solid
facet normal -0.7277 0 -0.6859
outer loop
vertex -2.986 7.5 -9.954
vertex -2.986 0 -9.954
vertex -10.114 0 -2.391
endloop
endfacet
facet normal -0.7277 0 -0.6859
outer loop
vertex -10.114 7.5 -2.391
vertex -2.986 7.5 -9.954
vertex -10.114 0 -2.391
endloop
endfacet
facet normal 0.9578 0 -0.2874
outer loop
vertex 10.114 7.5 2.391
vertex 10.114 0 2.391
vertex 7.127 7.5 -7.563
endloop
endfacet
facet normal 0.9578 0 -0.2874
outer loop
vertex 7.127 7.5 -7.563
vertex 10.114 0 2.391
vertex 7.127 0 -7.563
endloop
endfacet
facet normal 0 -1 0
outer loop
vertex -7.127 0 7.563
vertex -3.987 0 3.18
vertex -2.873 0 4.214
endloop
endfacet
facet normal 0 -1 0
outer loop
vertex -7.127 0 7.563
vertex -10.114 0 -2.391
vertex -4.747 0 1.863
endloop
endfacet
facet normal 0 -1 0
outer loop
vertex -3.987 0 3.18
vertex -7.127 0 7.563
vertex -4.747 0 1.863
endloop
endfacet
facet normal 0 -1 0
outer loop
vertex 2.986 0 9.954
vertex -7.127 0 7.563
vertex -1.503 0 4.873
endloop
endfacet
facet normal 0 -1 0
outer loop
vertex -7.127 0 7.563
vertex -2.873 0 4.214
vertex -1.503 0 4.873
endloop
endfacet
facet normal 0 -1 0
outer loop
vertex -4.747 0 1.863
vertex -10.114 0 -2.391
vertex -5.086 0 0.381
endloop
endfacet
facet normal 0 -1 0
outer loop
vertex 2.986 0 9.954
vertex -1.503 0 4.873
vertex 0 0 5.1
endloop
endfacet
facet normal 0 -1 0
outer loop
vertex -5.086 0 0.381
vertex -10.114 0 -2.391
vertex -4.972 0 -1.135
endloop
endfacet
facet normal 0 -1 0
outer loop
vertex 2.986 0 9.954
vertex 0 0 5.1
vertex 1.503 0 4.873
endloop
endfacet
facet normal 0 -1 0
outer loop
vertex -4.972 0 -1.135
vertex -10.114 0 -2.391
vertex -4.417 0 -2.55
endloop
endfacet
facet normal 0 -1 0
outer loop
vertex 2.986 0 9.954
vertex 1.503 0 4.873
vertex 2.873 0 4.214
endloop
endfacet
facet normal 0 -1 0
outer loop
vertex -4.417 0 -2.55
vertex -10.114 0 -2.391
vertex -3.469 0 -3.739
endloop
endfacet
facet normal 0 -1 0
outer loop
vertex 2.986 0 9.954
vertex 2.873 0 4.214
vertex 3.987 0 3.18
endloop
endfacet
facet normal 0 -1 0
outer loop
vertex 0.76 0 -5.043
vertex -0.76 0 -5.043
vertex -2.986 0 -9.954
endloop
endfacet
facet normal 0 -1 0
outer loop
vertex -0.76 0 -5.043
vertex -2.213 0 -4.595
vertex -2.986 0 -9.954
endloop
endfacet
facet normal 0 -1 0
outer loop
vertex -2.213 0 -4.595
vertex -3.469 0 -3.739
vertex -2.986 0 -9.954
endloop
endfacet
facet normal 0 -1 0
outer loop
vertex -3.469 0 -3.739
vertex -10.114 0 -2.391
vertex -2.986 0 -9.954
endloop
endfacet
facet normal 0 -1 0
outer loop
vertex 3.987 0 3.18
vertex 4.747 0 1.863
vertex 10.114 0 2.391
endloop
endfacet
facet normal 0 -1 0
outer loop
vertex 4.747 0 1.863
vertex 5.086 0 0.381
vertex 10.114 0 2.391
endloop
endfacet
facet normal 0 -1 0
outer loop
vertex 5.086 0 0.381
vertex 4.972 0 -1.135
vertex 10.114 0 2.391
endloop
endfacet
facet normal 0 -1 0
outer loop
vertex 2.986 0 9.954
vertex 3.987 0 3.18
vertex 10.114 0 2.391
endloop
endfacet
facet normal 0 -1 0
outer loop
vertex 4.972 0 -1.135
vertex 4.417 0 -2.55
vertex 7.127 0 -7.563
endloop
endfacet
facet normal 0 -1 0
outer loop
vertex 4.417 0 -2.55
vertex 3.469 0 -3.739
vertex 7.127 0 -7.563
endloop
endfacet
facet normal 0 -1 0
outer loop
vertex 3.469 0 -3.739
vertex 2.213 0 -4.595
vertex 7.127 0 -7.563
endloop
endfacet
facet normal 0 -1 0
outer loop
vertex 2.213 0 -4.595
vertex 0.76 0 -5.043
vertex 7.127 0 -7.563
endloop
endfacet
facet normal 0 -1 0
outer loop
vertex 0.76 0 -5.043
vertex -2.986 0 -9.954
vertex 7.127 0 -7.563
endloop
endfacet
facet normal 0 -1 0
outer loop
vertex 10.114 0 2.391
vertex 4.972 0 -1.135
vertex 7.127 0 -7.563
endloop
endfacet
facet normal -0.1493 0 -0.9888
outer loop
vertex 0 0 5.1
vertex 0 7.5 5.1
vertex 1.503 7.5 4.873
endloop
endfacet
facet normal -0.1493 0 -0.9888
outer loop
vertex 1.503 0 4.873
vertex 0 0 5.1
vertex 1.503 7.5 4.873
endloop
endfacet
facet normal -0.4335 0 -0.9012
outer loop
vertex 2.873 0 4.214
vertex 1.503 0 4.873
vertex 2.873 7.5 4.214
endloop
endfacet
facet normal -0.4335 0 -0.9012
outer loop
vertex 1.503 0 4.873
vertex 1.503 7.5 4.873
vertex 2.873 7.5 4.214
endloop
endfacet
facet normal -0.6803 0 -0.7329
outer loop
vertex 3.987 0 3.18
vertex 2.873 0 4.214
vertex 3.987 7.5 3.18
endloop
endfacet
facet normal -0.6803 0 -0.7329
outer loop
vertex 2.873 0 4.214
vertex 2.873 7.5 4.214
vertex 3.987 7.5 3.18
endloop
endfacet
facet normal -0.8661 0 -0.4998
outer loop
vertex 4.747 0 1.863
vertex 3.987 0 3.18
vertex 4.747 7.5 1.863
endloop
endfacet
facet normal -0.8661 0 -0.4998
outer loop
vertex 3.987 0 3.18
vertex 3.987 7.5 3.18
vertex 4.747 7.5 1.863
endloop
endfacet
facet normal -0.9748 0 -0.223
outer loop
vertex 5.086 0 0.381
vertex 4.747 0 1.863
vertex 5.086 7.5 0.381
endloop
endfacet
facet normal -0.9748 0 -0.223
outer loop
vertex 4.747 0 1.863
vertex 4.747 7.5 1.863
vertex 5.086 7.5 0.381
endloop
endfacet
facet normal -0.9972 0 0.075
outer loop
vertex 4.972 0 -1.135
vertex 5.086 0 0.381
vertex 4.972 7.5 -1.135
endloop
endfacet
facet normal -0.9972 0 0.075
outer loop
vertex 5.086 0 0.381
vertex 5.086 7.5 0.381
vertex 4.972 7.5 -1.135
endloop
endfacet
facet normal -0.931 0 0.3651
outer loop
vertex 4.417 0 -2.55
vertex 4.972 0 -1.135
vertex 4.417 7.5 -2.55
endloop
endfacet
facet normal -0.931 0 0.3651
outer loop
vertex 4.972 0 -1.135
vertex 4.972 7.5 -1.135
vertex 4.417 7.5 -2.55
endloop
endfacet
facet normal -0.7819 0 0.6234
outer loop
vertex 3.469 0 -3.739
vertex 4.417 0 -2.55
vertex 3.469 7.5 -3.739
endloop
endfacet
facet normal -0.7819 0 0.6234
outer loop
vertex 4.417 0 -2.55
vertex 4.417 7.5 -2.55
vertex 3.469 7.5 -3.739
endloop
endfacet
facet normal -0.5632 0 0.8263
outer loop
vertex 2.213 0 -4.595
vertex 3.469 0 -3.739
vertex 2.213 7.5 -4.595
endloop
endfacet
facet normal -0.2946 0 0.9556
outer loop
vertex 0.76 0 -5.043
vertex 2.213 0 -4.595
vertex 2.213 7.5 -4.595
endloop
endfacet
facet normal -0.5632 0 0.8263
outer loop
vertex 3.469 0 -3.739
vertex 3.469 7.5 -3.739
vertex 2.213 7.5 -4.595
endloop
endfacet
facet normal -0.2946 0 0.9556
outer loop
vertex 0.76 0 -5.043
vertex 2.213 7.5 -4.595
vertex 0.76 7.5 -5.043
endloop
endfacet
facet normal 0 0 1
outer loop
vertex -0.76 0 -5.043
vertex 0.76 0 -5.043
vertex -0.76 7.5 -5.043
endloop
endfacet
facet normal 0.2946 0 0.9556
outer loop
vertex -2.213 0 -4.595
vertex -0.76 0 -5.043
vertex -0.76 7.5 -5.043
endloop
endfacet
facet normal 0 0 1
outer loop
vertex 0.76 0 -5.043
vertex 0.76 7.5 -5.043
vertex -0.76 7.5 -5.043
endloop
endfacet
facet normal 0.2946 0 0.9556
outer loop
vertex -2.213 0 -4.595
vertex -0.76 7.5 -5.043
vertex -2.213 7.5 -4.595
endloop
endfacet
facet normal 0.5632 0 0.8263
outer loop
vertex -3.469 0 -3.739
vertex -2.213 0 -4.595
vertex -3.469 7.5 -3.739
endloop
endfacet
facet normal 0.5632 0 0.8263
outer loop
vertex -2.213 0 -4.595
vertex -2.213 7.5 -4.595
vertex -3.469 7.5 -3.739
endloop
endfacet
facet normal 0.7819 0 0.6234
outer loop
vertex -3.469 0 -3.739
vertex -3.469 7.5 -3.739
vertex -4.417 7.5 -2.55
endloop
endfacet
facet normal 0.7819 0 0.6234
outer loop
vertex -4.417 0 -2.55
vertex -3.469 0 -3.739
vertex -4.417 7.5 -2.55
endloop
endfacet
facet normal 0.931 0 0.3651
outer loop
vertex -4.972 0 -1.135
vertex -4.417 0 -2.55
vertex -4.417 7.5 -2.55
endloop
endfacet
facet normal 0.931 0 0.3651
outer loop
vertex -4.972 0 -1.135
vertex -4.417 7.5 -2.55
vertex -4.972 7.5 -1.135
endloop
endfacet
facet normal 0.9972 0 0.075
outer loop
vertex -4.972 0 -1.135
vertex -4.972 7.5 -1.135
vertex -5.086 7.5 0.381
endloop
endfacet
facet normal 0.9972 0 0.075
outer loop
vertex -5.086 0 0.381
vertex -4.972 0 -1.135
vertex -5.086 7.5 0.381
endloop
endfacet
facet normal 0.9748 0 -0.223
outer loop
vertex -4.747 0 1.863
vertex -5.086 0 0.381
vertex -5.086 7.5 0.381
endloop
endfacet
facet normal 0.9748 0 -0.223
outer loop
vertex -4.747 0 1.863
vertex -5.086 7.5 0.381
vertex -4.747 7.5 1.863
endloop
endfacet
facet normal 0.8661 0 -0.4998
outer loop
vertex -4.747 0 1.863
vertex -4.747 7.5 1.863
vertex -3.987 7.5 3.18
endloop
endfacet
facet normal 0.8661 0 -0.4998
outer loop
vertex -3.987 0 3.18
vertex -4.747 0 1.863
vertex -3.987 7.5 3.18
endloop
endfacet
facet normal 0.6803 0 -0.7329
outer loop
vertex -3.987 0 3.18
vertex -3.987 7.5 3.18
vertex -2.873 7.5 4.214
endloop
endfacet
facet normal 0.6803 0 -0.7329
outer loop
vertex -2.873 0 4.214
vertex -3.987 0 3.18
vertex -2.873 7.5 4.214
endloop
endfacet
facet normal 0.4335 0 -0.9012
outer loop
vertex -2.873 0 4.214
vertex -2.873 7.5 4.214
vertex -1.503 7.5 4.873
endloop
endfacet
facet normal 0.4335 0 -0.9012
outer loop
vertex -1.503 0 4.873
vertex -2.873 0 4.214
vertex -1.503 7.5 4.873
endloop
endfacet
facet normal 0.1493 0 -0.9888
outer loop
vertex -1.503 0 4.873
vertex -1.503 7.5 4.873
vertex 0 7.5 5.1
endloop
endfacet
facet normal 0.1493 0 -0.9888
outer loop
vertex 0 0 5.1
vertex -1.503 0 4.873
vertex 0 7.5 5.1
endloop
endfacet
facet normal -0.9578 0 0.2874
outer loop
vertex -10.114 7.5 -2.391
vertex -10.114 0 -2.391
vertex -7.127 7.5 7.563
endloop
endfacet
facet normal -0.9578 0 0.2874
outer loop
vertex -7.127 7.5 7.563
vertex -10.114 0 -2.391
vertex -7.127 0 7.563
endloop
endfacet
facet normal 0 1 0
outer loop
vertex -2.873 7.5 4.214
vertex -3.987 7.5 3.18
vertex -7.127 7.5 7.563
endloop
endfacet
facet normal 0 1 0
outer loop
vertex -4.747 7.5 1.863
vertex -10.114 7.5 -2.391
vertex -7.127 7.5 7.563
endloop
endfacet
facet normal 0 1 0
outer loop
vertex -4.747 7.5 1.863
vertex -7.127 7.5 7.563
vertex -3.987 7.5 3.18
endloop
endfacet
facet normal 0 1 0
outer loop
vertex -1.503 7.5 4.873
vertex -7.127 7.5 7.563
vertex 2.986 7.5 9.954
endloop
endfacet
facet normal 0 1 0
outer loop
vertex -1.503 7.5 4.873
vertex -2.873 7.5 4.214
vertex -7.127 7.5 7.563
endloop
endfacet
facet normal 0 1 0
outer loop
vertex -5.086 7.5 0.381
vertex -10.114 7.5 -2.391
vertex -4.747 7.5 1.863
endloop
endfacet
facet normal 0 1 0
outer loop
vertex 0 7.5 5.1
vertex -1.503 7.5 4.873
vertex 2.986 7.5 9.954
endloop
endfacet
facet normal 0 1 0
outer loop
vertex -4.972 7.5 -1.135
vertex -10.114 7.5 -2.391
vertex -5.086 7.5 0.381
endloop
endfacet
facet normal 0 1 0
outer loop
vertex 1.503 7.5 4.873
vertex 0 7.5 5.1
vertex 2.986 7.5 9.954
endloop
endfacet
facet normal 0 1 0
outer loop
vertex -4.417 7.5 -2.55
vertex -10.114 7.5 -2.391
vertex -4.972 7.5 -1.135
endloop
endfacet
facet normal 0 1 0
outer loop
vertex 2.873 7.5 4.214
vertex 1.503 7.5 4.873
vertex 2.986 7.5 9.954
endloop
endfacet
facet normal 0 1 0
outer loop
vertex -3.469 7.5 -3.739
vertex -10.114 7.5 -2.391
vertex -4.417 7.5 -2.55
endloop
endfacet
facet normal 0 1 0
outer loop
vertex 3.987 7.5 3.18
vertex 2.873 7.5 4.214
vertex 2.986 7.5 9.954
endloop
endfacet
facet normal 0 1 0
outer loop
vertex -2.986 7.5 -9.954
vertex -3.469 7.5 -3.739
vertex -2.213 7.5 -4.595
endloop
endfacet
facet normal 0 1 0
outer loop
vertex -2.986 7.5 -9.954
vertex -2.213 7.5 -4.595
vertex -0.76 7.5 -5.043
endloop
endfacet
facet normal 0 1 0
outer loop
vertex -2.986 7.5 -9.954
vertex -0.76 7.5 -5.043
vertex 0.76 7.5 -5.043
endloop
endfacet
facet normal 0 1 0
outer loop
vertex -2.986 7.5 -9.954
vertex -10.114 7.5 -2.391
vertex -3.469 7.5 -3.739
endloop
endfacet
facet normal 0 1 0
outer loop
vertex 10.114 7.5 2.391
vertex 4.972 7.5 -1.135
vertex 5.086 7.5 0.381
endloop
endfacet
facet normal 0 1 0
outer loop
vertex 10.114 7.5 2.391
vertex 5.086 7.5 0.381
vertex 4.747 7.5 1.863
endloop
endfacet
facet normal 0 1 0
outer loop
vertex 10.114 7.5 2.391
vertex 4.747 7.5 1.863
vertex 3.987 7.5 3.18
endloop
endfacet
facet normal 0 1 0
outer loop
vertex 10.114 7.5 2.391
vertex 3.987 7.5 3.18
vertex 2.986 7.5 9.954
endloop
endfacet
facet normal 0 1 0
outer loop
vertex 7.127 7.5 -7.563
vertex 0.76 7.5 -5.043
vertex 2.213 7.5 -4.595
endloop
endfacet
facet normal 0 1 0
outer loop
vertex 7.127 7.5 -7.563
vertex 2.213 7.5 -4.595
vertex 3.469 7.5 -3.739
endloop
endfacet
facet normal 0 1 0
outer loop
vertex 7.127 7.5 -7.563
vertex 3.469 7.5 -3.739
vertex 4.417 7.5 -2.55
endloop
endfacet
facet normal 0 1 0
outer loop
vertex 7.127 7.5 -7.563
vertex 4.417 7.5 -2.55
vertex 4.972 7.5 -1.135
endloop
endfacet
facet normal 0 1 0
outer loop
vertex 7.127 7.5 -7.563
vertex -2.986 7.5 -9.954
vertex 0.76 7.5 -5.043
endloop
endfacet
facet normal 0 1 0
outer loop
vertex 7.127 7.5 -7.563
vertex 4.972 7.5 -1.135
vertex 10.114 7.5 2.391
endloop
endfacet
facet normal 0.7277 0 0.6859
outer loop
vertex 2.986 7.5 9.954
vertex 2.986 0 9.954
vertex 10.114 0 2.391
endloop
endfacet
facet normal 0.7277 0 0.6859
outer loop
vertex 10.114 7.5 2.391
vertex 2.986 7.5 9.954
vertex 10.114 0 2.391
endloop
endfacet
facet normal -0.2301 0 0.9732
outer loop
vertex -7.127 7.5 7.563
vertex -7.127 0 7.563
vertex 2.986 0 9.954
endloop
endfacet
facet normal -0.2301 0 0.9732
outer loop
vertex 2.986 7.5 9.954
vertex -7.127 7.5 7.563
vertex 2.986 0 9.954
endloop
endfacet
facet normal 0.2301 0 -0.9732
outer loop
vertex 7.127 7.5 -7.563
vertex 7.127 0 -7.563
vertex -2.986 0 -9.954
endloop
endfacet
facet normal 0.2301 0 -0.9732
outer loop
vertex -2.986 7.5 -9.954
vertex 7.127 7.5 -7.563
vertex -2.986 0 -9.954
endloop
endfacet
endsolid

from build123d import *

# Parameters (mm, degrees)
EXTRUDE_1_DEPTH                   = 7.5
HOLE_WIZARD_M12_1_D               = 10.2
HOLE_WIZARD_M12_1_DEPTH           = 29.25
HOLE_WIZARD_M12_1_TIP             = 3.064389157
HOLE_WIZARD_M12_1_ON_FACE_2_D     = 10.2
HOLE_WIZARD_M12_1_ON_FACE_2_DEPTH = 29.25
HOLE_WIZARD_M12_1_ON_FACE_2_TIP   = 3.064389157


with BuildPart() as part:
    # 草图1 → 凸台-拉伸1 (new body)
    with BuildSketch(Plane(origin=(0, 0, 0), x_dir=(1, 0, 0), z_dir=(0, 1, 0))):
        Polygon((2.986206823, -9.954022745), (10.113539979, -2.390880402), (7.127333155, 7.563142343), (-2.986206823, 9.954022745), (-10.113539979, 2.390880402), (-7.127333155, -7.563142343), align=None)
    extrude(amount=EXTRUDE_1_DEPTH)

    # M12 螺纹孔1
    with Locations(Plane(origin=(0, 0, 0), x_dir=(0, 0, -1), z_dir=(0, -1, 0))):
        with Locations((0, 0)):
            Hole(HOLE_WIZARD_M12_1_D / 2, depth=HOLE_WIZARD_M12_1_DEPTH)
            with Locations((0, 0, -(HOLE_WIZARD_M12_1_DEPTH + HOLE_WIZARD_M12_1_TIP / 2))):  # 118° drill point
                Cone(0, HOLE_WIZARD_M12_1_D / 2, HOLE_WIZARD_M12_1_TIP, mode=Mode.SUBTRACT)

    # M12 螺纹孔1 on face 2
    with Locations(Plane.ZX.offset(7.5)):
        with Locations((0, 0)):
            Hole(HOLE_WIZARD_M12_1_ON_FACE_2_D / 2, depth=HOLE_WIZARD_M12_1_ON_FACE_2_DEPTH)
            with Locations((0, 0, -(HOLE_WIZARD_M12_1_ON_FACE_2_DEPTH + HOLE_WIZARD_M12_1_ON_FACE_2_TIP / 2))):  # 118° drill point
                Cone(0, HOLE_WIZARD_M12_1_ON_FACE_2_D / 2, HOLE_WIZARD_M12_1_ON_FACE_2_TIP, mode=Mode.SUBTRACT)


solid = part.part
